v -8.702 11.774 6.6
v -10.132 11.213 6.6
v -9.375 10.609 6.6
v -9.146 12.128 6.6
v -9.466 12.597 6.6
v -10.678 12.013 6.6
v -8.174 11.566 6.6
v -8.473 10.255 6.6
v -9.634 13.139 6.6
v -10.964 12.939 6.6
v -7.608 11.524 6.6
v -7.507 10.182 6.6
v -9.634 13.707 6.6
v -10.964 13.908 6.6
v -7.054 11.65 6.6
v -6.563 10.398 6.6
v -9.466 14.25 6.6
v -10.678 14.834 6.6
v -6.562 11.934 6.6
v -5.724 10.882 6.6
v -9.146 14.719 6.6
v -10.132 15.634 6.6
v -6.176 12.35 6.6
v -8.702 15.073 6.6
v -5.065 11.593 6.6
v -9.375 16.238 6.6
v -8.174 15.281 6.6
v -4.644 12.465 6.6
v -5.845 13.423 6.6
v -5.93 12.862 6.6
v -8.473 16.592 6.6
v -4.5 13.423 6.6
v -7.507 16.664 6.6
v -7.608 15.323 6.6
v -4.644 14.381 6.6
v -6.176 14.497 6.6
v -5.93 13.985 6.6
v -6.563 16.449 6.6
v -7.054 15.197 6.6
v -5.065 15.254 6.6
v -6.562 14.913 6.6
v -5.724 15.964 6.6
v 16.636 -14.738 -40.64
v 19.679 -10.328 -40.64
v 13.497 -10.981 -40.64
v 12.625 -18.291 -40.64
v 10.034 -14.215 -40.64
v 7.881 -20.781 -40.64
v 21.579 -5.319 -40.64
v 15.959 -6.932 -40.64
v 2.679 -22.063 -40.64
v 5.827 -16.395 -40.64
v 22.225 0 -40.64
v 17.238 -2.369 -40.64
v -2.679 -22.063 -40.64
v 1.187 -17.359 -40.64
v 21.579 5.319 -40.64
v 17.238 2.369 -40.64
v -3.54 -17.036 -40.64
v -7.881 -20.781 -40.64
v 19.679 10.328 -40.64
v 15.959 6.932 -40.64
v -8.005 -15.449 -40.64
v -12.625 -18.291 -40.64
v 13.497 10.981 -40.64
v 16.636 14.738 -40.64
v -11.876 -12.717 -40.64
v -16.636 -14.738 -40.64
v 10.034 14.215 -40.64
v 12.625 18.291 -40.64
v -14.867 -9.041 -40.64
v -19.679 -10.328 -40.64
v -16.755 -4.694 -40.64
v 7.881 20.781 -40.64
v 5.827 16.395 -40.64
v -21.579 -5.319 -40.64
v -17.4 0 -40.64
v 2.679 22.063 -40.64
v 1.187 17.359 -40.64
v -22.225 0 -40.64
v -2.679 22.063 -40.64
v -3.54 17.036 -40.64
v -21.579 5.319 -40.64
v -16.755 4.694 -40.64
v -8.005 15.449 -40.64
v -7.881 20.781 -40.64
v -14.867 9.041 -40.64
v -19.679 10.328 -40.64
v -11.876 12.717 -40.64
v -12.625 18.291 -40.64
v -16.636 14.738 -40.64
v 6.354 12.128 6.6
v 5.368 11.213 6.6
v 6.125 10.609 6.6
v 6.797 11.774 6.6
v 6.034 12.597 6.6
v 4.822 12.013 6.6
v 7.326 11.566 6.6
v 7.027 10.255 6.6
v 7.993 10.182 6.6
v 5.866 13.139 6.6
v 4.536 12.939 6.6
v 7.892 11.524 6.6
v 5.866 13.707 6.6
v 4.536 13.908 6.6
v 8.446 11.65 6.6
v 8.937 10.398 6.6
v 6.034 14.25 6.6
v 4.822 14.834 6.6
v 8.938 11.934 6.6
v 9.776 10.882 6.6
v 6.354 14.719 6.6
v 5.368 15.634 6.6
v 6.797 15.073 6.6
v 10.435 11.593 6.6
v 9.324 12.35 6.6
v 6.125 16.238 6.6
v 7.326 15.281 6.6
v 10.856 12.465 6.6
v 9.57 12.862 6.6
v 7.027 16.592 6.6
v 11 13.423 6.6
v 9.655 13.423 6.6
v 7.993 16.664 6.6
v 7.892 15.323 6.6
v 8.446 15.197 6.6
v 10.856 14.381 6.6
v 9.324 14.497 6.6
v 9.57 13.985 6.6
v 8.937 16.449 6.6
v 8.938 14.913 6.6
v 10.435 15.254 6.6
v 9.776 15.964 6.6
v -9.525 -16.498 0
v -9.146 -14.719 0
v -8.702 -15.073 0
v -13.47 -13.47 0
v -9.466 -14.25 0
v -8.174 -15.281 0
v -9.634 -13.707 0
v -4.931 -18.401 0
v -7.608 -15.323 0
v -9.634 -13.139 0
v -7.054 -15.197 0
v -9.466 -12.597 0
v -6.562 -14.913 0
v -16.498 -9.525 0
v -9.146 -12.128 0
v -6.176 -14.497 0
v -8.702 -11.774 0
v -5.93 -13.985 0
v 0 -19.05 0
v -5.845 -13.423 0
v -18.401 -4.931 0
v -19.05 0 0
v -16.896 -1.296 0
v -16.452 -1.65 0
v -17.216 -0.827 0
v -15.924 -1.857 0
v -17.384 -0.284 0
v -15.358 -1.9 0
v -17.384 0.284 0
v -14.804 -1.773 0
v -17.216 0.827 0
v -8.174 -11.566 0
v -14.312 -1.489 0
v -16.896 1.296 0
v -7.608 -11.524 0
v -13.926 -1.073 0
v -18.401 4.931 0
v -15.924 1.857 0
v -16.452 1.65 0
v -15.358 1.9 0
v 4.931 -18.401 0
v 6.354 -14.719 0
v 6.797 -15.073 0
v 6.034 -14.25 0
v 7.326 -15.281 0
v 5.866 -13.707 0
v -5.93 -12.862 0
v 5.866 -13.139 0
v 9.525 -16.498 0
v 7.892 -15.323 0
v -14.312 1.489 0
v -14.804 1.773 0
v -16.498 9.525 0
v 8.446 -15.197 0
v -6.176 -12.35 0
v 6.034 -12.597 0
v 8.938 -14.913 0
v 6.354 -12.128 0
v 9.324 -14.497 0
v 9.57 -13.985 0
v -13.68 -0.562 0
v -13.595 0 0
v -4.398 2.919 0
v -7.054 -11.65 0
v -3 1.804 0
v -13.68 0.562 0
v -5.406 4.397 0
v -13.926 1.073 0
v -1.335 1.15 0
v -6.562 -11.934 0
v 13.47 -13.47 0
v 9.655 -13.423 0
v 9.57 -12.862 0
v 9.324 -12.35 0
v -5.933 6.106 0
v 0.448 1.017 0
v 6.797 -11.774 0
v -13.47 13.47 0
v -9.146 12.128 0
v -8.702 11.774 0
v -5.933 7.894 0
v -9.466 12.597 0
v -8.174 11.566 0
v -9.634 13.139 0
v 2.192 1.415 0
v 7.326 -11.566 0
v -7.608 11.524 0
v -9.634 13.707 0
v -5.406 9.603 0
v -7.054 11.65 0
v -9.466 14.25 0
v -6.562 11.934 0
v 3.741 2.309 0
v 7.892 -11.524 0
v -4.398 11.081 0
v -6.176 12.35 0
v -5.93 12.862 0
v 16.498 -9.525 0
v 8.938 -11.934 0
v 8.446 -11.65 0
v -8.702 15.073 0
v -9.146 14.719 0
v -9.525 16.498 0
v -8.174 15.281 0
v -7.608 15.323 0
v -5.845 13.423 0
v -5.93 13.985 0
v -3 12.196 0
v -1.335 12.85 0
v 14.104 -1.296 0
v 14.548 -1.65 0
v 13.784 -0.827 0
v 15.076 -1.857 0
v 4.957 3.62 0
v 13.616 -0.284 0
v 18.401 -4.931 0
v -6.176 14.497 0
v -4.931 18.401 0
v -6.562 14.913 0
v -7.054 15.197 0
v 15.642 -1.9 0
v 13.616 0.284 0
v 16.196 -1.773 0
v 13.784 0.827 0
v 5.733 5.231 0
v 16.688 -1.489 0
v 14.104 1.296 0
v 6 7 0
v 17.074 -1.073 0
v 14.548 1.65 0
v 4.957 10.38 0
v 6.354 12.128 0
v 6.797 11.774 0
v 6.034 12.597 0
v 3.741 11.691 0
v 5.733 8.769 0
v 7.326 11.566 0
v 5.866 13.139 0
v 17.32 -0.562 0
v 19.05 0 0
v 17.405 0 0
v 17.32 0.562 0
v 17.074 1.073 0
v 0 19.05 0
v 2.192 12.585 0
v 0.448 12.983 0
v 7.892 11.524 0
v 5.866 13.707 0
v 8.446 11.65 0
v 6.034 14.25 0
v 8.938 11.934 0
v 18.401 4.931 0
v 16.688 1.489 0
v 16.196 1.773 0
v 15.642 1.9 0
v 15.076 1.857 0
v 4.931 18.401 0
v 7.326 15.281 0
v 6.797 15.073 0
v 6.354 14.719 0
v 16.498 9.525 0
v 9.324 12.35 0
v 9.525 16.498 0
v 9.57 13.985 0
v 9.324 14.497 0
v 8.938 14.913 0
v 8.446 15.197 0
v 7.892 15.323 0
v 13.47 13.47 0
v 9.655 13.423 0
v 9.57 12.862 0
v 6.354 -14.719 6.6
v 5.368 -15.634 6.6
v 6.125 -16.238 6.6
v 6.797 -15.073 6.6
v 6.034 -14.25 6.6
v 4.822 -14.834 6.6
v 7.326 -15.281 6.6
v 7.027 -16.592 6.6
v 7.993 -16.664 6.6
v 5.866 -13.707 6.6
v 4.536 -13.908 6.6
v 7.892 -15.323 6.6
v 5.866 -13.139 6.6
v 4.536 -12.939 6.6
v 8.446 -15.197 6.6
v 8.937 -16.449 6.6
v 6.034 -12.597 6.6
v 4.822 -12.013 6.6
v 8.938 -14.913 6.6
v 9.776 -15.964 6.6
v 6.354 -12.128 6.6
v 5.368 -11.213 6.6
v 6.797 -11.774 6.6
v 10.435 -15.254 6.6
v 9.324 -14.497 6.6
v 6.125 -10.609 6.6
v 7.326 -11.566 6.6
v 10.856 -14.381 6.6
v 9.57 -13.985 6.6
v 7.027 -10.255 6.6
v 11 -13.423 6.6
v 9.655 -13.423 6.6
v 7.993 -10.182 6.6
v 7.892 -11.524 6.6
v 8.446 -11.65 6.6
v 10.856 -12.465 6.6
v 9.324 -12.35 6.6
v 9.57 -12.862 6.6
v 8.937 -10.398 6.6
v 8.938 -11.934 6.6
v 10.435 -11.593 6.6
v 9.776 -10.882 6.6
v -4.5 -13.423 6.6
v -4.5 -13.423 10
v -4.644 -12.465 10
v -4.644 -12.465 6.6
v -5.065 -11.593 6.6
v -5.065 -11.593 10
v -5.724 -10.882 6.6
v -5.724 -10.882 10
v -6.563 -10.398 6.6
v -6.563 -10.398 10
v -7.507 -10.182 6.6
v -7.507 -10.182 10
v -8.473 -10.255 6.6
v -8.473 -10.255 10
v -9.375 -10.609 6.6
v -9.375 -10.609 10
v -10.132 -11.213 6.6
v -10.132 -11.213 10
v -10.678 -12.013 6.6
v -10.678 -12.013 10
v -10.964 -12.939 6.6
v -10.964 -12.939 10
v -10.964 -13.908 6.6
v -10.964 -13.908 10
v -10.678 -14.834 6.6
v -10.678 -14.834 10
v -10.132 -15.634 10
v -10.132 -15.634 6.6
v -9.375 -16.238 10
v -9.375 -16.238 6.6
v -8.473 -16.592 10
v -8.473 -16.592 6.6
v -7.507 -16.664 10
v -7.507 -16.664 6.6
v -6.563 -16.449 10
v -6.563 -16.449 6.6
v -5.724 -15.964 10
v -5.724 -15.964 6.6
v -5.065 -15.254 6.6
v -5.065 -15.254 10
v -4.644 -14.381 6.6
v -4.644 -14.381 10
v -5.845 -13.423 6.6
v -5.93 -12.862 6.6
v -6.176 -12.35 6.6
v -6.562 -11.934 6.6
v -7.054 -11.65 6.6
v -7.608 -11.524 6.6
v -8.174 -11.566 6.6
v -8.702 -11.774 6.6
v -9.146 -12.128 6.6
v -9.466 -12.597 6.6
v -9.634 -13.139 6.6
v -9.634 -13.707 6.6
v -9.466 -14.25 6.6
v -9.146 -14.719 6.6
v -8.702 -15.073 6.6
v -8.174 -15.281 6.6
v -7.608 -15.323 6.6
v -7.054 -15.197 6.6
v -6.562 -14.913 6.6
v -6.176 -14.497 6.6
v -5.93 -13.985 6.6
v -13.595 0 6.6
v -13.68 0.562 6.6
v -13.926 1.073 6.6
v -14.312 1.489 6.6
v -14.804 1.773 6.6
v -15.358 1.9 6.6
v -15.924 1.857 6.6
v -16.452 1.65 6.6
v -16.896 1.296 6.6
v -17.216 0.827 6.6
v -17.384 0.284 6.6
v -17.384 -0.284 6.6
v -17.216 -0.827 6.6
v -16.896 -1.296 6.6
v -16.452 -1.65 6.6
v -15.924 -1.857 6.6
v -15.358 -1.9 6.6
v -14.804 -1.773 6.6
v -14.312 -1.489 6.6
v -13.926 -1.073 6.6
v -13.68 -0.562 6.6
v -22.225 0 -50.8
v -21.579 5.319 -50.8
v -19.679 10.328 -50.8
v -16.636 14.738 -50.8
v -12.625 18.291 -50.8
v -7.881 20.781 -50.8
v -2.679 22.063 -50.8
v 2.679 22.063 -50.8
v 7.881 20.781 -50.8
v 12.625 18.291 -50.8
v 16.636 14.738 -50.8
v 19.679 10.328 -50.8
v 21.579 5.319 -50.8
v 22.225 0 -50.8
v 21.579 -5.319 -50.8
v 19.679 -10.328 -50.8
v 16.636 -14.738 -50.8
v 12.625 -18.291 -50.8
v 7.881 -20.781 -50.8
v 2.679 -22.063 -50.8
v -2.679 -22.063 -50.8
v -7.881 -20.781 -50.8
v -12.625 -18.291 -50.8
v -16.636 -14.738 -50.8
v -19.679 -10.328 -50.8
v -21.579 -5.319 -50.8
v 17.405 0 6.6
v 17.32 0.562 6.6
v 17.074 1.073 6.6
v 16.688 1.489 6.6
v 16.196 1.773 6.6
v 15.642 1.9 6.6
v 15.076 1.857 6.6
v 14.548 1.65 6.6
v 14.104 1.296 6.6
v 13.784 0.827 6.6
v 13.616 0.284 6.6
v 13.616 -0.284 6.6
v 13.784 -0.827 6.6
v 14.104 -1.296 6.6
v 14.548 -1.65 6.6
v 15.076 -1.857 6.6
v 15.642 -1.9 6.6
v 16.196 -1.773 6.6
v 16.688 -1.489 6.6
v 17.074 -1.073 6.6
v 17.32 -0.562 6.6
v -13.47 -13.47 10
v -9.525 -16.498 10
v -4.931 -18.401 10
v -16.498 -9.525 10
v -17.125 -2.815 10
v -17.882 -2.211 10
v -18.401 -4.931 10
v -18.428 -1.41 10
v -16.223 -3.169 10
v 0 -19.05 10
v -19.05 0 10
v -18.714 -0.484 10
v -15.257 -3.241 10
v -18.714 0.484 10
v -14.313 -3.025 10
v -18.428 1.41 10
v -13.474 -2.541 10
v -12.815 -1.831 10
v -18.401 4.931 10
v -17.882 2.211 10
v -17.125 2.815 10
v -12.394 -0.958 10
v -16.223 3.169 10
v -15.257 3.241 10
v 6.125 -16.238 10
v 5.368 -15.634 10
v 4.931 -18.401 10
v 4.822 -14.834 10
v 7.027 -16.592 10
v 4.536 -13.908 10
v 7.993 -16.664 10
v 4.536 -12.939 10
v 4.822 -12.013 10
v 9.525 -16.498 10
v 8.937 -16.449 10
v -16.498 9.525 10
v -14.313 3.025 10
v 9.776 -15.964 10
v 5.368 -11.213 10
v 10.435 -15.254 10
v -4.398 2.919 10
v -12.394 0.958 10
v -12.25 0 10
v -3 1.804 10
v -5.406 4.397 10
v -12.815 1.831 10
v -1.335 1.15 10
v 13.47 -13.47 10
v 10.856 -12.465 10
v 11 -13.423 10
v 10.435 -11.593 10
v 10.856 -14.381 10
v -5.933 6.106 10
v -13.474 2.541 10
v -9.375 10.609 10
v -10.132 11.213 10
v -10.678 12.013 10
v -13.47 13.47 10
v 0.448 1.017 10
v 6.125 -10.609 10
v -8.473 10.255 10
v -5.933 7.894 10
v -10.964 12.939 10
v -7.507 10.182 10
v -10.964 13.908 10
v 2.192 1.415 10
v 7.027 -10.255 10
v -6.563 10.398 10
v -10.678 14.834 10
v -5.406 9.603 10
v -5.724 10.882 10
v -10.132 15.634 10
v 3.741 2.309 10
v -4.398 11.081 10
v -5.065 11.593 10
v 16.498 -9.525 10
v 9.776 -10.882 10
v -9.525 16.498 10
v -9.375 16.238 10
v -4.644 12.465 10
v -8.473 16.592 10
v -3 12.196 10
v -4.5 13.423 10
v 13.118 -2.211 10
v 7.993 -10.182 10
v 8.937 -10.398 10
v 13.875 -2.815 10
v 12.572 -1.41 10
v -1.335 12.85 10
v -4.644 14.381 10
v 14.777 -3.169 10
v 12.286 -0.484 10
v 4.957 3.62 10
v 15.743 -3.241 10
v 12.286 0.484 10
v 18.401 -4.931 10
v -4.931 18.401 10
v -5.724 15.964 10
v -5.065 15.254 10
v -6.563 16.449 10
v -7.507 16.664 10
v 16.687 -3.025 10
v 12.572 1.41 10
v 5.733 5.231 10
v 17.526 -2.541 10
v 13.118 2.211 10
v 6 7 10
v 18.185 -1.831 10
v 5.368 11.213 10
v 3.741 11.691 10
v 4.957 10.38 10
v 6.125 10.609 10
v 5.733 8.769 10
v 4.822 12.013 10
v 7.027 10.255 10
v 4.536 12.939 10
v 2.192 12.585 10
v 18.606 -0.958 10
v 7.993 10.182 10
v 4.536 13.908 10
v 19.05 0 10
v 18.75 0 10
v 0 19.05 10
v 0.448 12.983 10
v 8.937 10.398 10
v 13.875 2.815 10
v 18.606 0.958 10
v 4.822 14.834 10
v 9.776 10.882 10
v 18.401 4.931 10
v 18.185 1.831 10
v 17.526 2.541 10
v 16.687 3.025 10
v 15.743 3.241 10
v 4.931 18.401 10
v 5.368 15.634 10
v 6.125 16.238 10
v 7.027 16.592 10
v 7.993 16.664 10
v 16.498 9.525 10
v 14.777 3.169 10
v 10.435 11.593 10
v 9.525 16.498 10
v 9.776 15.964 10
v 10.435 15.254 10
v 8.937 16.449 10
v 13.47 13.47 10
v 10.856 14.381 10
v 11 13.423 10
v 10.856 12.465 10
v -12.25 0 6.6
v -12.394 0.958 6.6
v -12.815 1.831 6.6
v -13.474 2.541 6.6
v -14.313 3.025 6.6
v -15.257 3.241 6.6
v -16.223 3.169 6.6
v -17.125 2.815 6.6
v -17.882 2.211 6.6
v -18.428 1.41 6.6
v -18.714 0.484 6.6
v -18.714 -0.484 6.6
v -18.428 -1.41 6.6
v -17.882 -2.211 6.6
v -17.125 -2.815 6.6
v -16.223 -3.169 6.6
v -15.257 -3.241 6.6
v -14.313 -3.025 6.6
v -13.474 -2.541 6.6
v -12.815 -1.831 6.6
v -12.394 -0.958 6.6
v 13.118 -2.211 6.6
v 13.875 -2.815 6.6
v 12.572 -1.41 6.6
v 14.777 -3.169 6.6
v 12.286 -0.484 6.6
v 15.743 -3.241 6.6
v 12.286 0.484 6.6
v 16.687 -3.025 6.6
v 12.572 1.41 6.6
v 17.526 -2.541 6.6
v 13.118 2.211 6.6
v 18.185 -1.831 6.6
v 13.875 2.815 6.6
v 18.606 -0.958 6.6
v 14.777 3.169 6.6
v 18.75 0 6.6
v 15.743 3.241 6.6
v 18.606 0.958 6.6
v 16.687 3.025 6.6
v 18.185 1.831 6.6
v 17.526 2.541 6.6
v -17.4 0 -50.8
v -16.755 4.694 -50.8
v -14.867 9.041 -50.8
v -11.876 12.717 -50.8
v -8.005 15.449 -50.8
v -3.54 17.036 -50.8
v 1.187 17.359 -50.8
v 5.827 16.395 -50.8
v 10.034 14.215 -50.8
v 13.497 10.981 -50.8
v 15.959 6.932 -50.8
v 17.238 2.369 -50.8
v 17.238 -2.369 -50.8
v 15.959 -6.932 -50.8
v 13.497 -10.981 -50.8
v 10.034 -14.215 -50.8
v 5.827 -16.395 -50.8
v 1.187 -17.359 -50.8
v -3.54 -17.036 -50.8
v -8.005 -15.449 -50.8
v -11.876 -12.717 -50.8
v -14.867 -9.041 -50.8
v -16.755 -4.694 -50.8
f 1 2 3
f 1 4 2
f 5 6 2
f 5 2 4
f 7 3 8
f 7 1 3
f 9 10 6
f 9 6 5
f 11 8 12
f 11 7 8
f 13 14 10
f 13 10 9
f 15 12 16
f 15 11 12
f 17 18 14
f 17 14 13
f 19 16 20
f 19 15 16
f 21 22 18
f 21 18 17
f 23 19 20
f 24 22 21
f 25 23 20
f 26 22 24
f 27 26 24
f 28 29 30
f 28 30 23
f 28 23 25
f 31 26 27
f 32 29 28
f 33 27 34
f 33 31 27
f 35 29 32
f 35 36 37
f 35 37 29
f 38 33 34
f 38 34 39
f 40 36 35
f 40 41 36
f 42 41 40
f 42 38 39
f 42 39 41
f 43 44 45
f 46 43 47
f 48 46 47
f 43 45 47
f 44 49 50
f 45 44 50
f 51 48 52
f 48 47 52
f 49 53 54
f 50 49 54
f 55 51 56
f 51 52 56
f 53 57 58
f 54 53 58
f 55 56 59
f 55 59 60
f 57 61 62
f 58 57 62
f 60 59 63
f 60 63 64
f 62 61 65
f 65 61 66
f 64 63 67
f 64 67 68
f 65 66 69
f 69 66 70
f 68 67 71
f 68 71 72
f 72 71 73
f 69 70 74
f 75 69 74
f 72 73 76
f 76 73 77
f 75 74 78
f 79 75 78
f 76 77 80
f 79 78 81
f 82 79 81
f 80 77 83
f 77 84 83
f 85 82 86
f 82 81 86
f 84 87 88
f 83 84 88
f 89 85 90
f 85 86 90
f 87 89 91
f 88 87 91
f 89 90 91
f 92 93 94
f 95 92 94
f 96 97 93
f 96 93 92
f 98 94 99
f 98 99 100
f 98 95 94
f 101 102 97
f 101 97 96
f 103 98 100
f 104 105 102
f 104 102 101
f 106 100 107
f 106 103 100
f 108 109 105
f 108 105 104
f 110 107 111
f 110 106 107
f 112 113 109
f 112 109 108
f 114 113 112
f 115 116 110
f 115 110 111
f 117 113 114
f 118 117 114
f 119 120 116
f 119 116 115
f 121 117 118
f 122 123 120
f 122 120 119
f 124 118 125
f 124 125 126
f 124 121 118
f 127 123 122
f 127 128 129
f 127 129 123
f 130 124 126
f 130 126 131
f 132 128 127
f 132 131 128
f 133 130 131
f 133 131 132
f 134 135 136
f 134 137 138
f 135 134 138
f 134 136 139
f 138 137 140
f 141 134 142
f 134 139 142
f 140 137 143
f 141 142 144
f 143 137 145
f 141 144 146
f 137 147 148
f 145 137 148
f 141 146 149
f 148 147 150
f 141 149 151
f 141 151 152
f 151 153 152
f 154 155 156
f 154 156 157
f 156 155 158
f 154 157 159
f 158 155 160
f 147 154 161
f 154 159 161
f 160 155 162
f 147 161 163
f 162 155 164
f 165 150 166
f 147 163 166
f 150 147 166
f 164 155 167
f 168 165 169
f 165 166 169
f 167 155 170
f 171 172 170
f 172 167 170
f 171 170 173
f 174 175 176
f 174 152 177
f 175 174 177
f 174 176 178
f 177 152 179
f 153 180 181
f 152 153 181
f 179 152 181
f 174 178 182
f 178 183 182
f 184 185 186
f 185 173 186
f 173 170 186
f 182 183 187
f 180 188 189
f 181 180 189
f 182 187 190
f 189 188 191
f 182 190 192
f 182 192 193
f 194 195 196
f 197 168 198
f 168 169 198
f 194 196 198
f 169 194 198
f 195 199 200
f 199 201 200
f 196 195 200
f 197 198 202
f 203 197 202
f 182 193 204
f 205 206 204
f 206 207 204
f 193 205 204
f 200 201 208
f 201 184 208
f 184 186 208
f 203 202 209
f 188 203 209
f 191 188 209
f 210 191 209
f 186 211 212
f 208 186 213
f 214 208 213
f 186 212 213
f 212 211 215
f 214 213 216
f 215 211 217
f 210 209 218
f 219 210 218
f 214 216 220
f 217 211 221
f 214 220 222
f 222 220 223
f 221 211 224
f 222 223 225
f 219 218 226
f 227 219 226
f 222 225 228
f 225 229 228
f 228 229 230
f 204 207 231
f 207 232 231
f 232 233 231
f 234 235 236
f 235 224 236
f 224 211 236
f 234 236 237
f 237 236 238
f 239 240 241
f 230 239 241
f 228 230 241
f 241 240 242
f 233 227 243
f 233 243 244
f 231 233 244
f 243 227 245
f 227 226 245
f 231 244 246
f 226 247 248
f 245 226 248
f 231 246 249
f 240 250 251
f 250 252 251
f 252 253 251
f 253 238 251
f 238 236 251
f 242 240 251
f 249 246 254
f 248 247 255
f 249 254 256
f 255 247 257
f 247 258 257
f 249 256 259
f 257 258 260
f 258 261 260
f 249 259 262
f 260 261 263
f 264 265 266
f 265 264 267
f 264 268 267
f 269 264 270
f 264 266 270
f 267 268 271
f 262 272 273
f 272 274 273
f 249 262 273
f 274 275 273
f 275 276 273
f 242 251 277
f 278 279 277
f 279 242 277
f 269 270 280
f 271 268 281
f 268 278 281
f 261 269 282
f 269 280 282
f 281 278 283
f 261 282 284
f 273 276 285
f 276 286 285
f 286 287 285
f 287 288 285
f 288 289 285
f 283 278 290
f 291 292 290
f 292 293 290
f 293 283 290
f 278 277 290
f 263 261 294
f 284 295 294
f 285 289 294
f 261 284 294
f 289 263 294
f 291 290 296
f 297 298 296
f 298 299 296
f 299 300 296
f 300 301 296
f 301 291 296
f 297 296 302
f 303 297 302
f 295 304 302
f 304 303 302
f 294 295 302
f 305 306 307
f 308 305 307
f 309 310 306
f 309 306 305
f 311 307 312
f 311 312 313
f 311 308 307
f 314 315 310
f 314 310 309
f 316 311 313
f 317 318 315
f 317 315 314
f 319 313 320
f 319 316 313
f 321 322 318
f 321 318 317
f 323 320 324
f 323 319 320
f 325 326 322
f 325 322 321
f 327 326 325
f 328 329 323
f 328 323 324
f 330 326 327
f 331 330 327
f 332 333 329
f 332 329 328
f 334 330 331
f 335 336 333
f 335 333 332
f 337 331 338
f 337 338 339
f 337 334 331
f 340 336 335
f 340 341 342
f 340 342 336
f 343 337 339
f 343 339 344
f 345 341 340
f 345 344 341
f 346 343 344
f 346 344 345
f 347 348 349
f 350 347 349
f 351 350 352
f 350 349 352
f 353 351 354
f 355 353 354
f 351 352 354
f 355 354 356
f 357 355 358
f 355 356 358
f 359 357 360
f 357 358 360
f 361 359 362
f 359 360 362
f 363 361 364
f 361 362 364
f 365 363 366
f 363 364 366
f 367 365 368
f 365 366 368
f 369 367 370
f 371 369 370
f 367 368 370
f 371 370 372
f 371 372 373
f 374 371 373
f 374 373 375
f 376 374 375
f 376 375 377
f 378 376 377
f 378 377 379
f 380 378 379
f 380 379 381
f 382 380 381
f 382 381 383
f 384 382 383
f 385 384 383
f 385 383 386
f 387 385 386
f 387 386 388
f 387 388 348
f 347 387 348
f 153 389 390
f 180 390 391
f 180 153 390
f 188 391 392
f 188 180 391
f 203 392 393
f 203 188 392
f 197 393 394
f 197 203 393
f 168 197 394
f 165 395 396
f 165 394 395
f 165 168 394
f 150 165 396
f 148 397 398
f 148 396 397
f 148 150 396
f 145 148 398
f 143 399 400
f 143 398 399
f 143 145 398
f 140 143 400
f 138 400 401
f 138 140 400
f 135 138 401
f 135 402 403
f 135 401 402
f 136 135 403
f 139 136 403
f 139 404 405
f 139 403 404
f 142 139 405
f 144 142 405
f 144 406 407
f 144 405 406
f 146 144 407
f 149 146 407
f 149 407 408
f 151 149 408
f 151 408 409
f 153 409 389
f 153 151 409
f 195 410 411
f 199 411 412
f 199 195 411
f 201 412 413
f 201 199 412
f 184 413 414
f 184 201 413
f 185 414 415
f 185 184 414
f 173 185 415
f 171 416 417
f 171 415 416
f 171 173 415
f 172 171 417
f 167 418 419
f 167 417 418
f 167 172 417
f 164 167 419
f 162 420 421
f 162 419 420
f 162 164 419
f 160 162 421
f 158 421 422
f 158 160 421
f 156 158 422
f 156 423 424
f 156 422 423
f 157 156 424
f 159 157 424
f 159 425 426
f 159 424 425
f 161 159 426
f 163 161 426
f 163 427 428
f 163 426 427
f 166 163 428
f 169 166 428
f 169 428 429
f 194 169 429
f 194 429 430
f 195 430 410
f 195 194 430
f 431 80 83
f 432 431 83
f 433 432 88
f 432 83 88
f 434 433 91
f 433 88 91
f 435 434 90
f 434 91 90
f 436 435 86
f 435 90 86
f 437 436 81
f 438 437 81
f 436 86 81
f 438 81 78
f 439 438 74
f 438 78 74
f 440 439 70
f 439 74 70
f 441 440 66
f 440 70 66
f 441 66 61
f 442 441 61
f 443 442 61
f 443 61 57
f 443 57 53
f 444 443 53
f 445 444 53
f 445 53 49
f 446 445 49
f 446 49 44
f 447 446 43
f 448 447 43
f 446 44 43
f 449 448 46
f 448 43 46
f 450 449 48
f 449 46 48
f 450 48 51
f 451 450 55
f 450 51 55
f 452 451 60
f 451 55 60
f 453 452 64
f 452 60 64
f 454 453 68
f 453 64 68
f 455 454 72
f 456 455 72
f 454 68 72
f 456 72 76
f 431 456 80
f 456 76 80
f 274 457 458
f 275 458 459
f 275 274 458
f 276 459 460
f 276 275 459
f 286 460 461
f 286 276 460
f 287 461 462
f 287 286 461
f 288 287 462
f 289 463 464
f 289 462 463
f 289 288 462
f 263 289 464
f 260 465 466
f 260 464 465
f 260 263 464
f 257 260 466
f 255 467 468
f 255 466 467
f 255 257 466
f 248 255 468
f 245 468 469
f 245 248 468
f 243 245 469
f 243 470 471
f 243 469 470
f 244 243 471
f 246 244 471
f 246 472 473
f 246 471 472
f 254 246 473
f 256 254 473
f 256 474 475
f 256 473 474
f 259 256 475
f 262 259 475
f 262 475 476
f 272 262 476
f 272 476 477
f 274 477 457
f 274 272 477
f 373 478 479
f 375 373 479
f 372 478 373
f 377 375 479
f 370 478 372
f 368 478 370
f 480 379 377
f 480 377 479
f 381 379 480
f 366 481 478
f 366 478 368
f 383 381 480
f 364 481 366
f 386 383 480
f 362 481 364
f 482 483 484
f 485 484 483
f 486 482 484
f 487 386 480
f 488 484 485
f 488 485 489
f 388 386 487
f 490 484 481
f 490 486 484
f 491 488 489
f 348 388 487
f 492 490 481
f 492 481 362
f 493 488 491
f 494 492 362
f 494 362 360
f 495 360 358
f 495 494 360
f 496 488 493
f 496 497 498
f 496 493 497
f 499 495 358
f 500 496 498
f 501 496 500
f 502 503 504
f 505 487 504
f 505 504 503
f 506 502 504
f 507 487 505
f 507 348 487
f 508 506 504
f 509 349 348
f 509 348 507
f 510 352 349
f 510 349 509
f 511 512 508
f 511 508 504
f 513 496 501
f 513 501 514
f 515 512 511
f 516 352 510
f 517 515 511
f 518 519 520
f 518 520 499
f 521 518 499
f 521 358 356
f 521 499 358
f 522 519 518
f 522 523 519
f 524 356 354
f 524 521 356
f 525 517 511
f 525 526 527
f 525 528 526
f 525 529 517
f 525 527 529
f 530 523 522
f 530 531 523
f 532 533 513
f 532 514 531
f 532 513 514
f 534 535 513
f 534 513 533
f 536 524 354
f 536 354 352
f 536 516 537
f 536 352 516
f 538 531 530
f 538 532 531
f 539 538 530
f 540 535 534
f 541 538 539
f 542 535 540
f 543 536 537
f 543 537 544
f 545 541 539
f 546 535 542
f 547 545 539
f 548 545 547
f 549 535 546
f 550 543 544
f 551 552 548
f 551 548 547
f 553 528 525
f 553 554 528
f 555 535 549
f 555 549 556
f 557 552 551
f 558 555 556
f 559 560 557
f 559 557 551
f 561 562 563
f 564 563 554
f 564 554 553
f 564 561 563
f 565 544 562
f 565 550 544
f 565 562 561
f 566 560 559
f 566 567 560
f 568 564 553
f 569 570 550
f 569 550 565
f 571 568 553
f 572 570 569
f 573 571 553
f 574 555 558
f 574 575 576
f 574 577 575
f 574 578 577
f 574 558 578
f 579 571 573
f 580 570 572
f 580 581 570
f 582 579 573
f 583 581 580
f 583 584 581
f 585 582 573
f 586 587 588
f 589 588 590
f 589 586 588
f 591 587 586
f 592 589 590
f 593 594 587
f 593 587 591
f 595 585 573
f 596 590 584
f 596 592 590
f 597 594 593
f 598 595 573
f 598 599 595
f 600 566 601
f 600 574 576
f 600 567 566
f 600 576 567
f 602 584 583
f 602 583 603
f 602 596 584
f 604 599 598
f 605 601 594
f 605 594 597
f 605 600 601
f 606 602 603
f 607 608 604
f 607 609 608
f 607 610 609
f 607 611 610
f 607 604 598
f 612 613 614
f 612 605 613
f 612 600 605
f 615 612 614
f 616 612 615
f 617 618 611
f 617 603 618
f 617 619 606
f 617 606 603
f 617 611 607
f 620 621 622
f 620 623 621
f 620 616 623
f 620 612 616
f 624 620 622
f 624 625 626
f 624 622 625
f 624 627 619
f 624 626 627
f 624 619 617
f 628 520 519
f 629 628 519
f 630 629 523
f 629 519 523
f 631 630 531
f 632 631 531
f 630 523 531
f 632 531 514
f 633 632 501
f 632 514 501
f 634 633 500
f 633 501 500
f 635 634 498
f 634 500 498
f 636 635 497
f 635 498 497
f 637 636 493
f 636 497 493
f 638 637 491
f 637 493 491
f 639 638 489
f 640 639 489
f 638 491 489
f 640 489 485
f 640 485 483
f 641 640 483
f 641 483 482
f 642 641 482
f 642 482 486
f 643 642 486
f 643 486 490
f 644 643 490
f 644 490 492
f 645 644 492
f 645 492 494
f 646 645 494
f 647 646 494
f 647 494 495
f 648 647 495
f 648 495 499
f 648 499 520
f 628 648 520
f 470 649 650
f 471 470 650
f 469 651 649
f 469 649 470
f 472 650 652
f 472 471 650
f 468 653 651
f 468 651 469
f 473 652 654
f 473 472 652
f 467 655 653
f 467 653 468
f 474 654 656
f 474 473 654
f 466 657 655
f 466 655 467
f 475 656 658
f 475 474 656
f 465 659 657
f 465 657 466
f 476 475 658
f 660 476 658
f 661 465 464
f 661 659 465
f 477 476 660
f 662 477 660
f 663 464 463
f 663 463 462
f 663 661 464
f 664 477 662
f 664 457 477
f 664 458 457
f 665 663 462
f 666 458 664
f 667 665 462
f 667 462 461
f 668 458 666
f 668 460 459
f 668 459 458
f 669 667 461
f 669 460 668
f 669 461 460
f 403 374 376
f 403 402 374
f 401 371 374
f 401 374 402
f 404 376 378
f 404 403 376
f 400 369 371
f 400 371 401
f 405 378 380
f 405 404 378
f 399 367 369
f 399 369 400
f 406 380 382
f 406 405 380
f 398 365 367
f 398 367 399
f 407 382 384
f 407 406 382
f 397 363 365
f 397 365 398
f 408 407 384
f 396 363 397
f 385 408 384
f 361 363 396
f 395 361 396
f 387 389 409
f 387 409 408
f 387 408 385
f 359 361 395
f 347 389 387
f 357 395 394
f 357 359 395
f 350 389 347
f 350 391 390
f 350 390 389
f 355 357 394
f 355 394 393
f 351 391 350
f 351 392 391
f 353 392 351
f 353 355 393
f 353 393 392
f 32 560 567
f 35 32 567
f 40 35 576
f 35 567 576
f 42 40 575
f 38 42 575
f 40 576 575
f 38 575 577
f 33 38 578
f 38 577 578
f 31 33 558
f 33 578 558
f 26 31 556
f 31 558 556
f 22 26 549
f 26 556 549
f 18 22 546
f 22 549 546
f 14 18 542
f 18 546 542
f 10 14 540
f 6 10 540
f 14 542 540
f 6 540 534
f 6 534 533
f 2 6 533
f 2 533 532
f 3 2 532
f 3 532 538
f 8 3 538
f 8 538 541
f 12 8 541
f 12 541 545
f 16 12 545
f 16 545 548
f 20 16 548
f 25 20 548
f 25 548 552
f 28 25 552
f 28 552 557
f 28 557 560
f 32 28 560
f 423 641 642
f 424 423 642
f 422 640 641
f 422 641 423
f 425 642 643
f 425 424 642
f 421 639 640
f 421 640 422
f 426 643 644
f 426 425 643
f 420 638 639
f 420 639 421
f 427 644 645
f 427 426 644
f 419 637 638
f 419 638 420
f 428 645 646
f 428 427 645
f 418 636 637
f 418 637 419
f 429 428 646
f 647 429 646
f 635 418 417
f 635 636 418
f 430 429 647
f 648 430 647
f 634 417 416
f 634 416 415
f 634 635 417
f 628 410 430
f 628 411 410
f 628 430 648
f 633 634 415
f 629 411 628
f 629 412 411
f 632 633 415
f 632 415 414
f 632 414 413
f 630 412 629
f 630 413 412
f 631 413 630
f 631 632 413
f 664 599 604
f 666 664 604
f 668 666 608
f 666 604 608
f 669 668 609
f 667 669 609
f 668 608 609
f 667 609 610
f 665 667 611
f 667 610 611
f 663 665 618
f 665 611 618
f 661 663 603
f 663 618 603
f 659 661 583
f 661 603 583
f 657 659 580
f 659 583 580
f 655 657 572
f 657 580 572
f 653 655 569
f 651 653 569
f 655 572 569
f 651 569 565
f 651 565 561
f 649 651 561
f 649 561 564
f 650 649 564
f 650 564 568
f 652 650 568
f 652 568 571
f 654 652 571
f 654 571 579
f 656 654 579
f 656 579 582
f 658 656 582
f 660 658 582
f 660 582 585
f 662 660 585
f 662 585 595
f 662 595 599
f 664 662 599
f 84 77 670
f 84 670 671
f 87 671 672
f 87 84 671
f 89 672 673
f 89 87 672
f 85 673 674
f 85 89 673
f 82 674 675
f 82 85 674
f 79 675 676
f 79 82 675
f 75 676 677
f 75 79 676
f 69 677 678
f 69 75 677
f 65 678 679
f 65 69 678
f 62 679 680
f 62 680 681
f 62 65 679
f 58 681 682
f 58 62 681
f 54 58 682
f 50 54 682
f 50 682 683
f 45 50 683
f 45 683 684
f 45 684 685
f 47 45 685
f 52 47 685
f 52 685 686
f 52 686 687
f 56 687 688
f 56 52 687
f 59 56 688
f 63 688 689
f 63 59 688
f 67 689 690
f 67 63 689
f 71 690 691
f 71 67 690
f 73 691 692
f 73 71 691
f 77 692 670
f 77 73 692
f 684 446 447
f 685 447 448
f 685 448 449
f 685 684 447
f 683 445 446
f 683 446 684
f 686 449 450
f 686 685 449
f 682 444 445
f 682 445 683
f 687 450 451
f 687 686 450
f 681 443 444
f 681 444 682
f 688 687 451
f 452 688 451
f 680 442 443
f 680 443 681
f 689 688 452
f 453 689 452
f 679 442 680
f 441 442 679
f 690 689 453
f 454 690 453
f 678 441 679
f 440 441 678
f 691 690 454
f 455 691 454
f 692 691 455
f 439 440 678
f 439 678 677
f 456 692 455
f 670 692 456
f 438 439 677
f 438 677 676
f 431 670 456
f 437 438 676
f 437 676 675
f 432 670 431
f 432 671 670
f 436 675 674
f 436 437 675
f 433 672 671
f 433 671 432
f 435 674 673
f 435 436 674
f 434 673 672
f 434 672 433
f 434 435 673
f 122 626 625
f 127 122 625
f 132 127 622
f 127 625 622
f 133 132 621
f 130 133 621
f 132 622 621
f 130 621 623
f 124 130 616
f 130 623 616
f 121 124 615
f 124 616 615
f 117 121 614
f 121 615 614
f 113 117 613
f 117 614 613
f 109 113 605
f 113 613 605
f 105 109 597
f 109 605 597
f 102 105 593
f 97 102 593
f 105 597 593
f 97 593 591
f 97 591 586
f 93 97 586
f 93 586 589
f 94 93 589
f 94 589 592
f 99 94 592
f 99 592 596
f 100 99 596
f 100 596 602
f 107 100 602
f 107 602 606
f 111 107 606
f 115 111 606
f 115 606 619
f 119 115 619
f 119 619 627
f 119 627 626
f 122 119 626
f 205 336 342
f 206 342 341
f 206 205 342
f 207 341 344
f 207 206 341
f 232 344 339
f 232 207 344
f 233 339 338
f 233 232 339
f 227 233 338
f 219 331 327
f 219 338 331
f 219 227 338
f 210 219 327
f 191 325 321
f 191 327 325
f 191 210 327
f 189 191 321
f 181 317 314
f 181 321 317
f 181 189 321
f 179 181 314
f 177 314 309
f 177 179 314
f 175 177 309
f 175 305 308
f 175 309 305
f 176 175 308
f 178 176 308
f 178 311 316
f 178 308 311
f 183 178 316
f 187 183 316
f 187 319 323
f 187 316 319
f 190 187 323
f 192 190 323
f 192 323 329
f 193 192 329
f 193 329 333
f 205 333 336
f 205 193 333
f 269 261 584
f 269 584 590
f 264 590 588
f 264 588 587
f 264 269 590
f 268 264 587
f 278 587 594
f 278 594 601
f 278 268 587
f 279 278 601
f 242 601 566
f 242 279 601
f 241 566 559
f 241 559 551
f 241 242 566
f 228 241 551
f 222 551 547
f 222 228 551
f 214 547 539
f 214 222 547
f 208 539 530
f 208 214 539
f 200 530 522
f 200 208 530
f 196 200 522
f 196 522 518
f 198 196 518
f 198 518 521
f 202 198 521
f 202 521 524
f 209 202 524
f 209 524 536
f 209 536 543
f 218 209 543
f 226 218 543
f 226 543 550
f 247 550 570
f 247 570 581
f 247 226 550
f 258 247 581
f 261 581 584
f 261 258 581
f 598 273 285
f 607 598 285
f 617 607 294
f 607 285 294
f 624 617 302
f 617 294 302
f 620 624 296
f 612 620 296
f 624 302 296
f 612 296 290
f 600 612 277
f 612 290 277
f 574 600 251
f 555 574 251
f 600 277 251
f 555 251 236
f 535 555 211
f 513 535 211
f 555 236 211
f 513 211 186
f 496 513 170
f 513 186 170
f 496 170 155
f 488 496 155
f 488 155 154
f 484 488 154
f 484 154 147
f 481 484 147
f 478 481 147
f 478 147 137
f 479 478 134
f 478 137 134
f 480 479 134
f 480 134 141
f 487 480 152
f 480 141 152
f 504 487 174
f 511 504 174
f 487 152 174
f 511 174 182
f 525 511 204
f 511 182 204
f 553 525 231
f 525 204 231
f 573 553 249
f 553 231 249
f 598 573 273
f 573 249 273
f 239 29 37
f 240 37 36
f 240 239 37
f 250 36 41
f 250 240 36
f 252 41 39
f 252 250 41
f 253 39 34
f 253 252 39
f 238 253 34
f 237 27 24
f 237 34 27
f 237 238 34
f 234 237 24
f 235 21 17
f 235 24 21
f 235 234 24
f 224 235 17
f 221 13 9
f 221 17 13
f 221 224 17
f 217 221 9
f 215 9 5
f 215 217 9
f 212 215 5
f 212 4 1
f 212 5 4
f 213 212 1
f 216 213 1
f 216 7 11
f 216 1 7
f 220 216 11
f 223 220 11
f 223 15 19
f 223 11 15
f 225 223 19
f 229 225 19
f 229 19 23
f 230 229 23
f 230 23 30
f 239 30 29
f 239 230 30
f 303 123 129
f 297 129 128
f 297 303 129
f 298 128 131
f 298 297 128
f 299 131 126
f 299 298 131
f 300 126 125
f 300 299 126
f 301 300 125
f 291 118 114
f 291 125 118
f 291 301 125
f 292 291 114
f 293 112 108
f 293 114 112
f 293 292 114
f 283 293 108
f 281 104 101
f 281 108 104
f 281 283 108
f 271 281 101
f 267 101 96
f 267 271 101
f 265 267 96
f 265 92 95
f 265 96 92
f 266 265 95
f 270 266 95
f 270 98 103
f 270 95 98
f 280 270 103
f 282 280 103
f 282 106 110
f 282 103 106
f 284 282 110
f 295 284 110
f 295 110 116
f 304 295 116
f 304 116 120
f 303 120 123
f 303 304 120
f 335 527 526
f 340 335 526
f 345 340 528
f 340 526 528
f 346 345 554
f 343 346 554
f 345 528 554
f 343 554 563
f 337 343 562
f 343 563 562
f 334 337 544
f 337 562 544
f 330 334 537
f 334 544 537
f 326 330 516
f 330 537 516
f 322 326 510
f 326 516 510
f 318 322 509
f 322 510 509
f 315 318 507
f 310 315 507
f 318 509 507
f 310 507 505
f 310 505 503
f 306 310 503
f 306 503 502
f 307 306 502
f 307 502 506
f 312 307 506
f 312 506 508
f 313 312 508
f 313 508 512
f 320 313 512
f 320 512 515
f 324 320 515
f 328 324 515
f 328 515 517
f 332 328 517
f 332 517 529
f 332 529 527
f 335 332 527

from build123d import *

# Parameters (mm, degrees)
SKETCH1_R                                           = 19.05
SKETCH1_R_2                                         = 6
SKETCH1_R_3                                         = 1.905
FACE_PLATE_DEPTH                                    = 10
CBORE_FOR_M3_HEX_SOCKET_HEAD_CAP_SCREW1_D           = 3.4
CBORE_FOR_M3_HEX_SOCKET_HEAD_CAP_SCREW1_CBORE_D     = 6.5
CBORE_FOR_M3_HEX_SOCKET_HEAD_CAP_SCREW1_CBORE_DEPTH = 3.4
SKETCH5_R                                           = 22.225
SKETCH5_R_2                                         = 17.4
BOSS_EXTRUDE1_DEPTH                                 = 10.16


with BuildPart() as part:
    # Sketch1 → Face Plate (new body)
    with BuildSketch(Plane.XY):
        Circle(SKETCH1_R)
        with Locations((0, 7)):
            Circle(SKETCH1_R_2, mode=Mode.SUBTRACT)
        with Locations((15.5, 0)):
            Circle(SKETCH1_R_3, mode=Mode.SUBTRACT)
        with Locations((7.75, -13.423393759)):
            Circle(SKETCH1_R_3, mode=Mode.SUBTRACT)
        with Locations((-7.75, -13.423393759)):
            Circle(SKETCH1_R_3, mode=Mode.SUBTRACT)
        with Locations((-15.5, 0)):
            Circle(SKETCH1_R_3, mode=Mode.SUBTRACT)
        with Locations((-7.75, 13.423393759)):
            Circle(SKETCH1_R_3, mode=Mode.SUBTRACT)
        with Locations((7.75, 13.423393759)):
            Circle(SKETCH1_R_3, mode=Mode.SUBTRACT)
    extrude(amount=FACE_PLATE_DEPTH)

    # CBORE for M3 Hex Socket Head Cap Screw1 (through all)
    with Locations(Plane.XY.offset(10)):
        with Locations((7.75, -13.423393759), (-7.75, -13.423393759), (-15.5, 0), (-7.75, 13.423393759), (7.75, 13.423393759), (15.5, 0)):
            CounterBoreHole(CBORE_FOR_M3_HEX_SOCKET_HEAD_CAP_SCREW1_D / 2, CBORE_FOR_M3_HEX_SOCKET_HEAD_CAP_SCREW1_CBORE_D / 2, CBORE_FOR_M3_HEX_SOCKET_HEAD_CAP_SCREW1_CBORE_DEPTH)


with BuildPart() as body_2:
    # Sketch5 → Boss-Extrude1 (new body)
    with BuildSketch(Plane(origin=(0, 0, -40.64), x_dir=(-1, 0, 0), z_dir=(0, 0, -1))):
        Circle(SKETCH5_R)
        Circle(SKETCH5_R_2, mode=Mode.SUBTRACT)
    extrude(amount=BOSS_EXTRUDE1_DEPTH)


solid = Compound([part.part, body_2.part])
